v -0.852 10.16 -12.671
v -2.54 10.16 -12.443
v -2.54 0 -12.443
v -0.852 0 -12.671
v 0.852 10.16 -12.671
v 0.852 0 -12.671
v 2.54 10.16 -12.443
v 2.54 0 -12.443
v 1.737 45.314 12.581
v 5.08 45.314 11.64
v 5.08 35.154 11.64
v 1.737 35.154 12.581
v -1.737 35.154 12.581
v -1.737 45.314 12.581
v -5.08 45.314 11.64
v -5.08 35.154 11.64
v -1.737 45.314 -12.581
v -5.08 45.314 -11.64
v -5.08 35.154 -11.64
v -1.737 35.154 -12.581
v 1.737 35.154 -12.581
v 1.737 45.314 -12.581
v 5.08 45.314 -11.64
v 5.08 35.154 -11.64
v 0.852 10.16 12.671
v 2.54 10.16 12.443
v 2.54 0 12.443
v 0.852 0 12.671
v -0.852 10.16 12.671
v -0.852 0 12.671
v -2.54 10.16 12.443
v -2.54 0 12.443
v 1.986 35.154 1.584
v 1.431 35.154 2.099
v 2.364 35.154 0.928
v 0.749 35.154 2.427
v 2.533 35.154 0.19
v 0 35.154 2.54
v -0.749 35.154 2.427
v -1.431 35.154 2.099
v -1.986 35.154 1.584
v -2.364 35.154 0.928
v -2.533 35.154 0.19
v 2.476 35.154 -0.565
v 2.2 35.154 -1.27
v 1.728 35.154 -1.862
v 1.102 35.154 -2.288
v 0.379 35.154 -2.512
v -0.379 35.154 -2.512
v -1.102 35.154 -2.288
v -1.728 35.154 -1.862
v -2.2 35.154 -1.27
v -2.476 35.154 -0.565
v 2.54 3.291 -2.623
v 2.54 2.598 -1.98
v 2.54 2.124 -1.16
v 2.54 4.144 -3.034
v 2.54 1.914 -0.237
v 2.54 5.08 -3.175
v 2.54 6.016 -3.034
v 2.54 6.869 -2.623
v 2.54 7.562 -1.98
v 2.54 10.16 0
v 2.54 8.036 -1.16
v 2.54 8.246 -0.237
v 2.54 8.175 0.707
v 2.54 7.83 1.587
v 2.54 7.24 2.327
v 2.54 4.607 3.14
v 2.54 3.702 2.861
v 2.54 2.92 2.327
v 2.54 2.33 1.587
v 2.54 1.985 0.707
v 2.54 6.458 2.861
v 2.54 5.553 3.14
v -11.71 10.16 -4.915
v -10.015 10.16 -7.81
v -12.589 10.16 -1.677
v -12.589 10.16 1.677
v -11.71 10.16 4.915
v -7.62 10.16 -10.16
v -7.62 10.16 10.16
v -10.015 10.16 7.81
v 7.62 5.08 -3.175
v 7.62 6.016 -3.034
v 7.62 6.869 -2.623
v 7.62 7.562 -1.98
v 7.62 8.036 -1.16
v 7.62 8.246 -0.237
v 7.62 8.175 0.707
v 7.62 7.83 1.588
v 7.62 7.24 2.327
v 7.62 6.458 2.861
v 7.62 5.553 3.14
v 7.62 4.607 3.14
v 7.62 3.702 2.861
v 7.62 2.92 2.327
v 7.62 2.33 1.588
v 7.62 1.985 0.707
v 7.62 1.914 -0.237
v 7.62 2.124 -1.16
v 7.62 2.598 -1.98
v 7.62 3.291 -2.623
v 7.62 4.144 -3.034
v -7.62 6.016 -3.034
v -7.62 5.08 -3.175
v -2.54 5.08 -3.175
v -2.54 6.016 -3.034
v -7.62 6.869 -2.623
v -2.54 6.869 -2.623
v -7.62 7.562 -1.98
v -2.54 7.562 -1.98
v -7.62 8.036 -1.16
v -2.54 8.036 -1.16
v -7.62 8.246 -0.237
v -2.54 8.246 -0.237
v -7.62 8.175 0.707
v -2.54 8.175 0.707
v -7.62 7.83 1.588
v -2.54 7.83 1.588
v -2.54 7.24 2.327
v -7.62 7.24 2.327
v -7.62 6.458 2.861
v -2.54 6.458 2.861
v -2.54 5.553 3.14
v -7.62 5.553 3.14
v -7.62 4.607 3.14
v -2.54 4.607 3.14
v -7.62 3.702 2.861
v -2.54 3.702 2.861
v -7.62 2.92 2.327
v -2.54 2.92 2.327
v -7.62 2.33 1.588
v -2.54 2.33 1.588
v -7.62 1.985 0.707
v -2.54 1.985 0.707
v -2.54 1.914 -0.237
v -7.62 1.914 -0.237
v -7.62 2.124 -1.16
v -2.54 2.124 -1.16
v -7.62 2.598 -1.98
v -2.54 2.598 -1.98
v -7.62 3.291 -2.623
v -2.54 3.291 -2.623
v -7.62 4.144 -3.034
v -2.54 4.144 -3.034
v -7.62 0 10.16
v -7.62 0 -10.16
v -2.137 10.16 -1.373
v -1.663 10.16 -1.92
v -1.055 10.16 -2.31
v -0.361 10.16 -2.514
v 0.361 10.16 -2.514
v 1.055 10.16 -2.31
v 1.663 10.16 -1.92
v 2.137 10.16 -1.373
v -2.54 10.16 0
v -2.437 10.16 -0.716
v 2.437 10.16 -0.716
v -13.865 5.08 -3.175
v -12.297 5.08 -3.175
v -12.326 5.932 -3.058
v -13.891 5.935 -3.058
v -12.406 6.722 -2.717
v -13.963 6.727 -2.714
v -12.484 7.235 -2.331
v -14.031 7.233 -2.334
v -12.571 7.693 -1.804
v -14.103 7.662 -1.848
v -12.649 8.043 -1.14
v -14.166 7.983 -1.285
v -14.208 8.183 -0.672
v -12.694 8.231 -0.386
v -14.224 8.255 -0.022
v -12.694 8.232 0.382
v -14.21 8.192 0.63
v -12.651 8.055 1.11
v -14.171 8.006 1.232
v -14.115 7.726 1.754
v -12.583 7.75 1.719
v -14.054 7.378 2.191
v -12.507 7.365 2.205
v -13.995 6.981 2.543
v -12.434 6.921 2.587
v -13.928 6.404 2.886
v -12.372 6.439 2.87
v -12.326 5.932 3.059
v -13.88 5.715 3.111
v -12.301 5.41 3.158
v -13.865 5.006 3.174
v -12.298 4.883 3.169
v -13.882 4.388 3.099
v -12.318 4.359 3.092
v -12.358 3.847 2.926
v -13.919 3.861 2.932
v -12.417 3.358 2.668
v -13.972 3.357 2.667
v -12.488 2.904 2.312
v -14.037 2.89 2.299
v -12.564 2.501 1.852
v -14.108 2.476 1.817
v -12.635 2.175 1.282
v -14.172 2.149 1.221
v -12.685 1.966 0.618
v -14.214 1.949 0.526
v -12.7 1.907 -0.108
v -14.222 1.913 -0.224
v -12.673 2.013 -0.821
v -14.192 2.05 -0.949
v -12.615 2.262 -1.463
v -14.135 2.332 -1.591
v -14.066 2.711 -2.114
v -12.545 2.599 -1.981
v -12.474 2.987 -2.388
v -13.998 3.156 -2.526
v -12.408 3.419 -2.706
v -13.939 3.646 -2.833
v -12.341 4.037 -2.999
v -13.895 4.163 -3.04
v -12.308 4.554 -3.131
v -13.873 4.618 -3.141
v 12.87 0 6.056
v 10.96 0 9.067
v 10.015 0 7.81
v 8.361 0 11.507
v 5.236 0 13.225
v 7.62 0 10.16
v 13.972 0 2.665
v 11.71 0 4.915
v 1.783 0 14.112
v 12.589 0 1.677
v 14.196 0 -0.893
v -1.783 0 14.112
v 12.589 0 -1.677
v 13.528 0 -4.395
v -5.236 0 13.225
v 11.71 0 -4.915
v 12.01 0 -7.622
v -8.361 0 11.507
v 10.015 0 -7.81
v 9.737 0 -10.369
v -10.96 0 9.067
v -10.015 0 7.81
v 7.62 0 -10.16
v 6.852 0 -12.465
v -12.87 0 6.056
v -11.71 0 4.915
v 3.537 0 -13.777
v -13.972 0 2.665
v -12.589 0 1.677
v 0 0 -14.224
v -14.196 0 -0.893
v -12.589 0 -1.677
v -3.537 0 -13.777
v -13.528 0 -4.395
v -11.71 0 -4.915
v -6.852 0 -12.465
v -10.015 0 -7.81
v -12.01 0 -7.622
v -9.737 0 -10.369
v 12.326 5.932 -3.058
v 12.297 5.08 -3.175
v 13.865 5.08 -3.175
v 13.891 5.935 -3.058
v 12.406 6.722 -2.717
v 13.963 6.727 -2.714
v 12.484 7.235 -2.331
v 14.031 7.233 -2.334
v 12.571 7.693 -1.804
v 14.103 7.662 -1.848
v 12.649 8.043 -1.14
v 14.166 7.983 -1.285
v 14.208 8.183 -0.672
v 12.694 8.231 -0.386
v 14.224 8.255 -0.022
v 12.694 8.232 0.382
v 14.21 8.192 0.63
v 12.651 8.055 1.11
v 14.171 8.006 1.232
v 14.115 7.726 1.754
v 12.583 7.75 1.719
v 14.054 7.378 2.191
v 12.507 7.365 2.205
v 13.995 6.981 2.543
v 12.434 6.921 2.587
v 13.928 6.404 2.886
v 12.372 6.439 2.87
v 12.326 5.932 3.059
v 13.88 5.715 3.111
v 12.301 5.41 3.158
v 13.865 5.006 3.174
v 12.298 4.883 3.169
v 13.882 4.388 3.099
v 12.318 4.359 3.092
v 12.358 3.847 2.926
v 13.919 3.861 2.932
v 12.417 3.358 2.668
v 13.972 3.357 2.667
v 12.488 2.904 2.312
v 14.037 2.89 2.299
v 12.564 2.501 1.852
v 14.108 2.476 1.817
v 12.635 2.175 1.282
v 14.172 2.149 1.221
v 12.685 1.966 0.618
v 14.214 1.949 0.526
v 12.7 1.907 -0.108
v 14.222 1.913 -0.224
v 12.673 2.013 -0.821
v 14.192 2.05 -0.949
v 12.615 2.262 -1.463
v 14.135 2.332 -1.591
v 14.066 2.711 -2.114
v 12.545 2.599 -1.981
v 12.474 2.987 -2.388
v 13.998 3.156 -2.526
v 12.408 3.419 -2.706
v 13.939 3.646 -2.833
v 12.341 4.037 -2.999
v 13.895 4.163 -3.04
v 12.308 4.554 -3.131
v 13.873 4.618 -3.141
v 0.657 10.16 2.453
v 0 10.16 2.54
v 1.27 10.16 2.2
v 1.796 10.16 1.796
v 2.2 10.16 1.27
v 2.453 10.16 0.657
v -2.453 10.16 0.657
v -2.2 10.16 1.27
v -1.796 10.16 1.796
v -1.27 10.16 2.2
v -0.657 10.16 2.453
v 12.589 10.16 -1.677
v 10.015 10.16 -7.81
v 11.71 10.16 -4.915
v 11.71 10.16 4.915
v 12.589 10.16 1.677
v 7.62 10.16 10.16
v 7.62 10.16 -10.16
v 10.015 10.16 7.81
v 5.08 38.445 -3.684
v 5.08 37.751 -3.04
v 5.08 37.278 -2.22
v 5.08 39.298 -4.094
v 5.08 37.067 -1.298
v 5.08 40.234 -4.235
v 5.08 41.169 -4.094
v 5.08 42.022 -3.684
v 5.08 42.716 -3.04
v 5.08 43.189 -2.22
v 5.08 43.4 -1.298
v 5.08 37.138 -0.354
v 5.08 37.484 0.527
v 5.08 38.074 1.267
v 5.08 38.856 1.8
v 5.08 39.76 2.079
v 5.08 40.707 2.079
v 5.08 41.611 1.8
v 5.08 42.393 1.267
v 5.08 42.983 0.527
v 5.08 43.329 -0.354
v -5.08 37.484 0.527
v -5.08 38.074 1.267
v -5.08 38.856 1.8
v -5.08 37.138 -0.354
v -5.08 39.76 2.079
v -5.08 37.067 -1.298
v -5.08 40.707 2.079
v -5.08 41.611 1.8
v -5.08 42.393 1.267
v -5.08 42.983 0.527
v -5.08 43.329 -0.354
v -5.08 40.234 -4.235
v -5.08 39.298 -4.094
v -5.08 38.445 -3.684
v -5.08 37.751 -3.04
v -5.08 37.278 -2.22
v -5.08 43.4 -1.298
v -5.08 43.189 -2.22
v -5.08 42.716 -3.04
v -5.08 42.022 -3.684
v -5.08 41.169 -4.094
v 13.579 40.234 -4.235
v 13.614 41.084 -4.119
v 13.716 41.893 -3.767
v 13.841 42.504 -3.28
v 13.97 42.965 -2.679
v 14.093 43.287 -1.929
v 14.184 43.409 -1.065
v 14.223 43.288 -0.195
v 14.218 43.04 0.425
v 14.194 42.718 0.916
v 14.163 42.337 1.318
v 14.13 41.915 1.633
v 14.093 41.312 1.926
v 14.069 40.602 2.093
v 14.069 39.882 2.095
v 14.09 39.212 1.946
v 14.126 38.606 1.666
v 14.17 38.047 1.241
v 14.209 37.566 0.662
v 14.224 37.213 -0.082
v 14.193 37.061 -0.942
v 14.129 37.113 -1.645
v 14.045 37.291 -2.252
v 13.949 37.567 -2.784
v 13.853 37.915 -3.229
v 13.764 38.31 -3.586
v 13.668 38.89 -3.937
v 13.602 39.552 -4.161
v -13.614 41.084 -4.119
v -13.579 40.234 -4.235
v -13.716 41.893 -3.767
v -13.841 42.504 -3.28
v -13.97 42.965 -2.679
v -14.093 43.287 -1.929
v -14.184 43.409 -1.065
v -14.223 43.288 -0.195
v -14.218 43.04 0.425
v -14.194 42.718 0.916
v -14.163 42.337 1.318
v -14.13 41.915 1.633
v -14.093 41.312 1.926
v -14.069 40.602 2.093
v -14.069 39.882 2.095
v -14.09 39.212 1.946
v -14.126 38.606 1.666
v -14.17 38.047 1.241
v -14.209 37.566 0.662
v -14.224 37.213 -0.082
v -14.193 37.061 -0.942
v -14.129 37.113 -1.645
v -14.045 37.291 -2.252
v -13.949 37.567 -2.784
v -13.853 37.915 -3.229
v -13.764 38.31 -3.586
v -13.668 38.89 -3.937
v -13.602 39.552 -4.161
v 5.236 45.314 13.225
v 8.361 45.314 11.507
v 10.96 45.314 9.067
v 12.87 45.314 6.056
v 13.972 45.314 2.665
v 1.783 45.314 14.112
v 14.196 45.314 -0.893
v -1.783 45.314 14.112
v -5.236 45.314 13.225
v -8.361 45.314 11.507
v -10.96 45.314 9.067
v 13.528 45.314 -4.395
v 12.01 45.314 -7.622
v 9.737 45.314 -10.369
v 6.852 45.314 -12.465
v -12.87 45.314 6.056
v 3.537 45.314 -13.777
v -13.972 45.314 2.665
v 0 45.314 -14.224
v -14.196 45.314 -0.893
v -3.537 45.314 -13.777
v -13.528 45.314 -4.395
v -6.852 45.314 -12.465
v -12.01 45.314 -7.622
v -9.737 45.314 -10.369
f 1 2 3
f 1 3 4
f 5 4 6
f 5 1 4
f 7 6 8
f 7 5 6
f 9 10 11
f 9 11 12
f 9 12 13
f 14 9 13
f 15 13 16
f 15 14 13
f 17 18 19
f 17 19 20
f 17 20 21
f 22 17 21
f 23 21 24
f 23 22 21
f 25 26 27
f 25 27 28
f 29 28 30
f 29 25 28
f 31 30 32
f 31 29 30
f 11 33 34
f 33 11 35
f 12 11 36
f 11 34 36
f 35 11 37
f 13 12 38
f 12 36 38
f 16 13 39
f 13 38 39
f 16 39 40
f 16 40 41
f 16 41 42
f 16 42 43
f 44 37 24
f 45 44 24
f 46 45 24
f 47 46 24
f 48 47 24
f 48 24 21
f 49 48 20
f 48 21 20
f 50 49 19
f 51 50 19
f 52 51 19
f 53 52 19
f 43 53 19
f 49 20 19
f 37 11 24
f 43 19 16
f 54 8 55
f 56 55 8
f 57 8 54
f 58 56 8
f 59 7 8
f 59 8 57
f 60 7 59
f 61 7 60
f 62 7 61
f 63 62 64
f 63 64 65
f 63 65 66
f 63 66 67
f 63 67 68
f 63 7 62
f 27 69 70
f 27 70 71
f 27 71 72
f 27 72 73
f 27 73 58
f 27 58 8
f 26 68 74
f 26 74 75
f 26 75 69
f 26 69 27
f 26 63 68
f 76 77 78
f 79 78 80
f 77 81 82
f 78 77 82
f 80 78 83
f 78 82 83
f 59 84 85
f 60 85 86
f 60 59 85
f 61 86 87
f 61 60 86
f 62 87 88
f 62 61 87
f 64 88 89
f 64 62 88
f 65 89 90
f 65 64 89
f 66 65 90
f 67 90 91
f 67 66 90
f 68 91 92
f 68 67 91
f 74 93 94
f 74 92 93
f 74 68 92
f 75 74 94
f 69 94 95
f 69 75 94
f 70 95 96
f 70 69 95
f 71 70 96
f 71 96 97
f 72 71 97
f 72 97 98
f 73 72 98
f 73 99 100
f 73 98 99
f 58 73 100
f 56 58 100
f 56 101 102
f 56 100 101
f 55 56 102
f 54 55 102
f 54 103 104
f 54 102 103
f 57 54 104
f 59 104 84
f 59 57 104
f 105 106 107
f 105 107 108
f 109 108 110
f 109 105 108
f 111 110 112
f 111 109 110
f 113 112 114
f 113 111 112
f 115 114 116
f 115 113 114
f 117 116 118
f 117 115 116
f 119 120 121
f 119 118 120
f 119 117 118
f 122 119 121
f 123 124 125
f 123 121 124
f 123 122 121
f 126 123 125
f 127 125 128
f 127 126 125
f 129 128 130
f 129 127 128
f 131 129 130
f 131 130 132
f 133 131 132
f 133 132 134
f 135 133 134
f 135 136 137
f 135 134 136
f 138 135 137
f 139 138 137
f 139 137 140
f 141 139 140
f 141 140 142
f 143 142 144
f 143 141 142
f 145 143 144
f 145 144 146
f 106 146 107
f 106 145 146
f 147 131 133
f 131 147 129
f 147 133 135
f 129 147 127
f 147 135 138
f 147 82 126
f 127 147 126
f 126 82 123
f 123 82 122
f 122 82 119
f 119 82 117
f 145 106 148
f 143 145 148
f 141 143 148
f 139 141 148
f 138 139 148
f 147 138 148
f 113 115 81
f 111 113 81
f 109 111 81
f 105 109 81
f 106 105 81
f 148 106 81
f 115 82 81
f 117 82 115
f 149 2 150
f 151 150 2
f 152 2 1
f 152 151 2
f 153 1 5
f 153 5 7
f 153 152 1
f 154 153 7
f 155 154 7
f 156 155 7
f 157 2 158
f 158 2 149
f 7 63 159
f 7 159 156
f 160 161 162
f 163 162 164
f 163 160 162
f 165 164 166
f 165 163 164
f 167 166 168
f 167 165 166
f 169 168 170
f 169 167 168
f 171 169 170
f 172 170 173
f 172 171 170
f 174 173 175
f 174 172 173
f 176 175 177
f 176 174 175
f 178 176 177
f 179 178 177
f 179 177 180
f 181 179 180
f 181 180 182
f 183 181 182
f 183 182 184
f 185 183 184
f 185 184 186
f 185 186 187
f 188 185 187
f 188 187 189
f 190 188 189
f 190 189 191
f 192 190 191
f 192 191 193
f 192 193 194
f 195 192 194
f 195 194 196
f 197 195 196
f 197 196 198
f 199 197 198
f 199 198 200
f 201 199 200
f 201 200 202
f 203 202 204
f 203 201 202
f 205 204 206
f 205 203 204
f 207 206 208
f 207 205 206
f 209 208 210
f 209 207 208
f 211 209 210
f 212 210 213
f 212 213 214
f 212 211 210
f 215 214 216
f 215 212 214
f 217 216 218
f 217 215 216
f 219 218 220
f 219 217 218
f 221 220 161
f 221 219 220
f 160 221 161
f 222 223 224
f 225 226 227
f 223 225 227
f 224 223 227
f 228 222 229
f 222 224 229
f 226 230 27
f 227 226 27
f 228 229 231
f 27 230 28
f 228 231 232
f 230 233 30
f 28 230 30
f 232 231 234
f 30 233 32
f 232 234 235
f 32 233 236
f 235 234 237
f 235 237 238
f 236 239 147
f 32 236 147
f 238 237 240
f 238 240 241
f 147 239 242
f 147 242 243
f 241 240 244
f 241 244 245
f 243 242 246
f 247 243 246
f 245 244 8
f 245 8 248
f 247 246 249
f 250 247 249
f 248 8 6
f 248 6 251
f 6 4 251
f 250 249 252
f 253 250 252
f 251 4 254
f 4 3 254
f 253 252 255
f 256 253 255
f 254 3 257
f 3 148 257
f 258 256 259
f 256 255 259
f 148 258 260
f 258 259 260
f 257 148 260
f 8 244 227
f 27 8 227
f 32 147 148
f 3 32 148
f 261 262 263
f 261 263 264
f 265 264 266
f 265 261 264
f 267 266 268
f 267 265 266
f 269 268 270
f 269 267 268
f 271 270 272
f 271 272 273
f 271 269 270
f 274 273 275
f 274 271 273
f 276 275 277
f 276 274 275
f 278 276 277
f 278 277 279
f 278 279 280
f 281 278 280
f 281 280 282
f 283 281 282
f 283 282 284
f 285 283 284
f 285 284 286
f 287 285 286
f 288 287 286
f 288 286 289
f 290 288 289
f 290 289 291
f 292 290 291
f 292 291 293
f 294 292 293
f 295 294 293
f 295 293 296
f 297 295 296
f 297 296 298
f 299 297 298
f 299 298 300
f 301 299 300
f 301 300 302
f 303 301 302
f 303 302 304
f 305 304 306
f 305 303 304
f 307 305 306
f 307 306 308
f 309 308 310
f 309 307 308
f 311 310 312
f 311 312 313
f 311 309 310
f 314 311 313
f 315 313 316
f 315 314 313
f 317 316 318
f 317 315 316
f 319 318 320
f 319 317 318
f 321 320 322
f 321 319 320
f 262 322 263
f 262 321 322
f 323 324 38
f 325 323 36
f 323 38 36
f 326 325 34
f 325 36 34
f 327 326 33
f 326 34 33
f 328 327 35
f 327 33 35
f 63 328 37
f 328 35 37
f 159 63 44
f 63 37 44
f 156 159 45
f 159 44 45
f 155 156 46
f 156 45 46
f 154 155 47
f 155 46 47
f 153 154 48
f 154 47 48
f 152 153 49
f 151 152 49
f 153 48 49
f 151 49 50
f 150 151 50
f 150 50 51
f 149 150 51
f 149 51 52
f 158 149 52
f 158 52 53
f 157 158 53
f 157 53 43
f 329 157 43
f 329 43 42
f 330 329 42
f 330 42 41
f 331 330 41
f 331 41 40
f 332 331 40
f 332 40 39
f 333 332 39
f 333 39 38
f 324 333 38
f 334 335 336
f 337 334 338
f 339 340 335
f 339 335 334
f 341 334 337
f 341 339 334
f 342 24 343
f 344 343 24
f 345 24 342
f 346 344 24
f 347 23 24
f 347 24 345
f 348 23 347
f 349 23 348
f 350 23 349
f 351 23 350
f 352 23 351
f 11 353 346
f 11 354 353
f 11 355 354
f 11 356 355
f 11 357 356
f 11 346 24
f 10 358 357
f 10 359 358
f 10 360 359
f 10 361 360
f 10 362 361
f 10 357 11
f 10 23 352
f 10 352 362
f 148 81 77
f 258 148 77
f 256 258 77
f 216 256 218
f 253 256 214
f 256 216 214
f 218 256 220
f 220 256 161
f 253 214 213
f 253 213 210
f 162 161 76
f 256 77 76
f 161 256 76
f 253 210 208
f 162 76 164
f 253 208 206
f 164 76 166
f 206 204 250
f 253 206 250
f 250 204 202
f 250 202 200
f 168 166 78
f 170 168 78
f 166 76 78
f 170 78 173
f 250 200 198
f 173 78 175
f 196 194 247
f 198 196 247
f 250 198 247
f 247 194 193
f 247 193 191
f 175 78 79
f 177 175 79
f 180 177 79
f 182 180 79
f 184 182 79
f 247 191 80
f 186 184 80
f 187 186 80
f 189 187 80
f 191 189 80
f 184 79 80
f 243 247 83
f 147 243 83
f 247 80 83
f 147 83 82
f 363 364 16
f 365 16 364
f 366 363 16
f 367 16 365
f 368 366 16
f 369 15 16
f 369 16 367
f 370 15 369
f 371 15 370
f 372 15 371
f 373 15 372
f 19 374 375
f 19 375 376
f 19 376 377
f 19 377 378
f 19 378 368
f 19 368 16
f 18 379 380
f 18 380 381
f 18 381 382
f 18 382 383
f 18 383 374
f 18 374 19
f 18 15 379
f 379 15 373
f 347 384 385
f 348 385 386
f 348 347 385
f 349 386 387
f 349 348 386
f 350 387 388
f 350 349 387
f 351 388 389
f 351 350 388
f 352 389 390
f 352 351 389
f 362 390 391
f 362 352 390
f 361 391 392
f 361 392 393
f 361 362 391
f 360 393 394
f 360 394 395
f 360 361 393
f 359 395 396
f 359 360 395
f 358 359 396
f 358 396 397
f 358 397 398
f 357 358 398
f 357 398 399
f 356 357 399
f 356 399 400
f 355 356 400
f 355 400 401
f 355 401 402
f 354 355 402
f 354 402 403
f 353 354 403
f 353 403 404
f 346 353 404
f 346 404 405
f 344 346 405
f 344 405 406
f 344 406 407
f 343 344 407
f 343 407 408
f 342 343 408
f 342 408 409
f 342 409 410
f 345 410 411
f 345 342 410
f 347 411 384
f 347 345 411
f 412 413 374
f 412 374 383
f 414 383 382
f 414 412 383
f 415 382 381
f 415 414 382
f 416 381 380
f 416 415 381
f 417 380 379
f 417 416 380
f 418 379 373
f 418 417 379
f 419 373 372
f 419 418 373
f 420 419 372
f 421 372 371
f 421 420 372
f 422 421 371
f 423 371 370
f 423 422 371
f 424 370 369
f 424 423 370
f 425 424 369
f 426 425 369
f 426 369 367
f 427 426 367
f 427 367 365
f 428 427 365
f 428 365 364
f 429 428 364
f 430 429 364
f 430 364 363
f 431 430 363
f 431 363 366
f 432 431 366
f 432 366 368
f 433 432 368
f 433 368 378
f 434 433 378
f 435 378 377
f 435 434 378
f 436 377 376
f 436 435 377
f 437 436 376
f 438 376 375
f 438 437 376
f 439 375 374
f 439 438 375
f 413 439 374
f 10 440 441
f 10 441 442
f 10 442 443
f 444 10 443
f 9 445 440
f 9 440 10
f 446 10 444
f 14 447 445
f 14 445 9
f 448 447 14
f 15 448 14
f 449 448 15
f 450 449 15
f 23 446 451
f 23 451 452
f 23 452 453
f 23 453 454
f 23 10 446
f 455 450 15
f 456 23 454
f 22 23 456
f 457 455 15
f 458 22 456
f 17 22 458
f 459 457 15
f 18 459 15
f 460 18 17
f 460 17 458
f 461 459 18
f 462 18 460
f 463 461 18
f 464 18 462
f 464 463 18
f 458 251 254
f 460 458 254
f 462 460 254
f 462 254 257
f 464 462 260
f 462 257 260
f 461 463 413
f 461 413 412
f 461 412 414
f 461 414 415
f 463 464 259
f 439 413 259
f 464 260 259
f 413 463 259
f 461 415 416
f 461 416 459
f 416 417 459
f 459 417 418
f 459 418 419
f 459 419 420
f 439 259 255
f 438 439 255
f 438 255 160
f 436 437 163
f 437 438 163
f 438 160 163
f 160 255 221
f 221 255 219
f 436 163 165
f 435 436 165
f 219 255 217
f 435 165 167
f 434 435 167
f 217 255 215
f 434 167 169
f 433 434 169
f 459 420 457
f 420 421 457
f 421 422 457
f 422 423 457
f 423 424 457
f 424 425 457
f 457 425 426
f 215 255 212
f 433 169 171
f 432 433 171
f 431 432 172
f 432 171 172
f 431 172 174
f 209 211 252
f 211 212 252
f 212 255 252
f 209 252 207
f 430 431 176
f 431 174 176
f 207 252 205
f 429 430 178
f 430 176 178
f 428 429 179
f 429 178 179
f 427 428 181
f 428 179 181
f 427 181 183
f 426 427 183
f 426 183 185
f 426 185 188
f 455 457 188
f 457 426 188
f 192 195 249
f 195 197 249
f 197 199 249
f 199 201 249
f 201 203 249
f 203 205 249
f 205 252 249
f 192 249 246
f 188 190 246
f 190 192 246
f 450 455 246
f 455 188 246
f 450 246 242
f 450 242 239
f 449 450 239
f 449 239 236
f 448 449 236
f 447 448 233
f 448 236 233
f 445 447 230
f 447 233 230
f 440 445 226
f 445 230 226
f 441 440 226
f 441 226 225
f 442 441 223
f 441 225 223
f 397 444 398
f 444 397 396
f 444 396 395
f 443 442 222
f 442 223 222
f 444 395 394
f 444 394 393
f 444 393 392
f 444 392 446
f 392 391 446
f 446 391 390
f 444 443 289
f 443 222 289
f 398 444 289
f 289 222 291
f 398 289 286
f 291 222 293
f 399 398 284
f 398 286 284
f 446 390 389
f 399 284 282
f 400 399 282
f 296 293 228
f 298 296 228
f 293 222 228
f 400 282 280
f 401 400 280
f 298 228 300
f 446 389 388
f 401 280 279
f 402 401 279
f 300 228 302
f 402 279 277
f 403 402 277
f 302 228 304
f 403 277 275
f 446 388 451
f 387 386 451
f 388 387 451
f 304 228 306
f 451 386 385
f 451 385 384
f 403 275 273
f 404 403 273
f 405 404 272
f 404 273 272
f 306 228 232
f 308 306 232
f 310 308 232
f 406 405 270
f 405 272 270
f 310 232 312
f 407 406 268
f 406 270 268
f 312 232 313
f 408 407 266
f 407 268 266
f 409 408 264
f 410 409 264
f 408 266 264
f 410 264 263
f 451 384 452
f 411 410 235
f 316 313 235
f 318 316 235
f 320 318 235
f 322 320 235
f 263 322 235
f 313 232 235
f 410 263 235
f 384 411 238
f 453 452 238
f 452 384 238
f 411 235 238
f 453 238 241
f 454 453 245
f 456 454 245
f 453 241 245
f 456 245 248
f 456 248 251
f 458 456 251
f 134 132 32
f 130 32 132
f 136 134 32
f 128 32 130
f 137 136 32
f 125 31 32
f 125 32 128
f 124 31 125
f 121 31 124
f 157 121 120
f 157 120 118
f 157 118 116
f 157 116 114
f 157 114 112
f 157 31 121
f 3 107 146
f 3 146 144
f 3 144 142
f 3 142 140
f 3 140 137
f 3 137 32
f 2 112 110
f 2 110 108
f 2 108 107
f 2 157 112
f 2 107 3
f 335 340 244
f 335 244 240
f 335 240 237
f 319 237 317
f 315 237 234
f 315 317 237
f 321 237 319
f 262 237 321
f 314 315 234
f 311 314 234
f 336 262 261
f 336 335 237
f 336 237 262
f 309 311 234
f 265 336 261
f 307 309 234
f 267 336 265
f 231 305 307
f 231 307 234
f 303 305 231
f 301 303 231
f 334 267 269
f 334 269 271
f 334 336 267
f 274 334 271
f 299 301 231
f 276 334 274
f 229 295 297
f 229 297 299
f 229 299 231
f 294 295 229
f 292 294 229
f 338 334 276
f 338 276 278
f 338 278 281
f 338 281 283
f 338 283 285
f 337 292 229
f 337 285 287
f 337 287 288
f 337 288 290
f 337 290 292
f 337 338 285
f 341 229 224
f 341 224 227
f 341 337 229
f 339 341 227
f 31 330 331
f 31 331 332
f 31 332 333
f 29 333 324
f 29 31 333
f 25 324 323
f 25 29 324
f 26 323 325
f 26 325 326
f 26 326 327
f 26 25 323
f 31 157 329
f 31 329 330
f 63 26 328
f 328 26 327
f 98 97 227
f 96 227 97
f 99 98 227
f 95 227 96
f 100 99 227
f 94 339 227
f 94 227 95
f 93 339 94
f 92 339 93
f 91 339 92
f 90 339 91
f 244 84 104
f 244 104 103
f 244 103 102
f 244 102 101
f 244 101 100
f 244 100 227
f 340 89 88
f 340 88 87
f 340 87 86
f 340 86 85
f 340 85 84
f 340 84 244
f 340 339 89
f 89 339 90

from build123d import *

# Parameters (mm, degrees)
SKETCH1_R               = 14.224
BOSS_EXTRUDE1_DEPTH     = 45.3136
CUT_EXTRUDE1_DEPTH      = 10.16
CUT_EXTRUDE2_START      = -10.16
CUT_EXTRUDE2_DEPTH      = 10.16
CUT_EXTRUDE3_DEPTH      = 52.266840521
CUT_EXTRUDE3_DEPTH_BACK = 52.266840521
SKETCH4_R               = 3.175
SKETCH5_R               = 2.54
CUT_EXTRUDE4_DEPTH      = 41.502098192


with BuildPart() as part:
    # Sketch1 → Boss-Extrude1 (new body)
    with BuildSketch(Plane(origin=(0, 0, 0), x_dir=(1, 0, 0), z_dir=(0, 1, 0))):
        with Locations(Location((0, 0, 0), (0, 0, 90))):
            Circle(SKETCH1_R)
    extrude(amount=BOSS_EXTRUDE1_DEPTH)

    # Sketch2 → Cut-Extrude1 (cut)
    with BuildSketch(Plane(origin=(0, 45.3136, 0), x_dir=(1, 0, 0), z_dir=(0, 1, 0))):
        with BuildLine():
            Line((5.08, 11.639742265), (5.08, -11.639742265))
            ThreePointArc((5.08, -11.639742265), (0, -12.7), (-5.08, -11.639742265))
            Line((-5.08, -11.639742265), (-5.08, 11.639742265))
            ThreePointArc((-5.08, 11.639742265), (0, 12.7), (5.08, 11.639742265))
        make_face()
    extrude(amount=-CUT_EXTRUDE1_DEPTH, mode=Mode.SUBTRACT)

    # Sketch3 → Cut-Extrude2 (cut)
    with BuildSketch(Plane.XZ.offset(CUT_EXTRUDE2_START)):
        with BuildLine():
            Line((-2.54, 12.443407893), (-2.54, -12.443407893))
            ThreePointArc((-2.54, -12.443407893), (0, -12.7), (2.54, -12.443407893))
            Line((2.54, -12.443407893), (2.54, 12.443407893))
            ThreePointArc((2.54, 12.443407893), (0, 12.7), (-2.54, 12.443407893))
        make_face()
        with BuildLine():
            Line((-7.62, 10.16), (-7.62, -10.16))
            ThreePointArc((-7.62, -10.16), (-12.7, 0), (-7.62, 10.16))
        make_face()
        with BuildLine():
            Line((7.62, 10.16), (7.62, -10.16))
            ThreePointArc((7.62, -10.16), (12.7, 0), (7.62, 10.16))
        make_face()
    extrude(amount=CUT_EXTRUDE2_DEPTH, mode=Mode.SUBTRACT)

    # Sketch4 → Cut-Extrude3 (cut, two sides: drawn at the far end of the back side and taken through both)
    with BuildSketch(Plane(origin=(-5.08, 0, 0), x_dir=(0, 0, -1), z_dir=(1, 0, 0)).offset(-CUT_EXTRUDE3_DEPTH_BACK)):
        with Locations((1.060257735, 40.2336)):
            Circle(SKETCH4_R)
        with Locations((0, 5.08)):
            Circle(SKETCH4_R)
    extrude(amount=CUT_EXTRUDE3_DEPTH + CUT_EXTRUDE3_DEPTH_BACK, mode=Mode.SUBTRACT)

    # Sketch5 → Cut-Extrude4 (cut, through all)
    with BuildSketch(Plane(origin=(0, 35.1536, 0), x_dir=(1, 0, 0), z_dir=(0, 1, 0))):
        with Locations(Location((0, 0, 0), (0, 0, 270))):
            Circle(SKETCH5_R)
    extrude(amount=-CUT_EXTRUDE4_DEPTH, mode=Mode.SUBTRACT)


solid = part.part
